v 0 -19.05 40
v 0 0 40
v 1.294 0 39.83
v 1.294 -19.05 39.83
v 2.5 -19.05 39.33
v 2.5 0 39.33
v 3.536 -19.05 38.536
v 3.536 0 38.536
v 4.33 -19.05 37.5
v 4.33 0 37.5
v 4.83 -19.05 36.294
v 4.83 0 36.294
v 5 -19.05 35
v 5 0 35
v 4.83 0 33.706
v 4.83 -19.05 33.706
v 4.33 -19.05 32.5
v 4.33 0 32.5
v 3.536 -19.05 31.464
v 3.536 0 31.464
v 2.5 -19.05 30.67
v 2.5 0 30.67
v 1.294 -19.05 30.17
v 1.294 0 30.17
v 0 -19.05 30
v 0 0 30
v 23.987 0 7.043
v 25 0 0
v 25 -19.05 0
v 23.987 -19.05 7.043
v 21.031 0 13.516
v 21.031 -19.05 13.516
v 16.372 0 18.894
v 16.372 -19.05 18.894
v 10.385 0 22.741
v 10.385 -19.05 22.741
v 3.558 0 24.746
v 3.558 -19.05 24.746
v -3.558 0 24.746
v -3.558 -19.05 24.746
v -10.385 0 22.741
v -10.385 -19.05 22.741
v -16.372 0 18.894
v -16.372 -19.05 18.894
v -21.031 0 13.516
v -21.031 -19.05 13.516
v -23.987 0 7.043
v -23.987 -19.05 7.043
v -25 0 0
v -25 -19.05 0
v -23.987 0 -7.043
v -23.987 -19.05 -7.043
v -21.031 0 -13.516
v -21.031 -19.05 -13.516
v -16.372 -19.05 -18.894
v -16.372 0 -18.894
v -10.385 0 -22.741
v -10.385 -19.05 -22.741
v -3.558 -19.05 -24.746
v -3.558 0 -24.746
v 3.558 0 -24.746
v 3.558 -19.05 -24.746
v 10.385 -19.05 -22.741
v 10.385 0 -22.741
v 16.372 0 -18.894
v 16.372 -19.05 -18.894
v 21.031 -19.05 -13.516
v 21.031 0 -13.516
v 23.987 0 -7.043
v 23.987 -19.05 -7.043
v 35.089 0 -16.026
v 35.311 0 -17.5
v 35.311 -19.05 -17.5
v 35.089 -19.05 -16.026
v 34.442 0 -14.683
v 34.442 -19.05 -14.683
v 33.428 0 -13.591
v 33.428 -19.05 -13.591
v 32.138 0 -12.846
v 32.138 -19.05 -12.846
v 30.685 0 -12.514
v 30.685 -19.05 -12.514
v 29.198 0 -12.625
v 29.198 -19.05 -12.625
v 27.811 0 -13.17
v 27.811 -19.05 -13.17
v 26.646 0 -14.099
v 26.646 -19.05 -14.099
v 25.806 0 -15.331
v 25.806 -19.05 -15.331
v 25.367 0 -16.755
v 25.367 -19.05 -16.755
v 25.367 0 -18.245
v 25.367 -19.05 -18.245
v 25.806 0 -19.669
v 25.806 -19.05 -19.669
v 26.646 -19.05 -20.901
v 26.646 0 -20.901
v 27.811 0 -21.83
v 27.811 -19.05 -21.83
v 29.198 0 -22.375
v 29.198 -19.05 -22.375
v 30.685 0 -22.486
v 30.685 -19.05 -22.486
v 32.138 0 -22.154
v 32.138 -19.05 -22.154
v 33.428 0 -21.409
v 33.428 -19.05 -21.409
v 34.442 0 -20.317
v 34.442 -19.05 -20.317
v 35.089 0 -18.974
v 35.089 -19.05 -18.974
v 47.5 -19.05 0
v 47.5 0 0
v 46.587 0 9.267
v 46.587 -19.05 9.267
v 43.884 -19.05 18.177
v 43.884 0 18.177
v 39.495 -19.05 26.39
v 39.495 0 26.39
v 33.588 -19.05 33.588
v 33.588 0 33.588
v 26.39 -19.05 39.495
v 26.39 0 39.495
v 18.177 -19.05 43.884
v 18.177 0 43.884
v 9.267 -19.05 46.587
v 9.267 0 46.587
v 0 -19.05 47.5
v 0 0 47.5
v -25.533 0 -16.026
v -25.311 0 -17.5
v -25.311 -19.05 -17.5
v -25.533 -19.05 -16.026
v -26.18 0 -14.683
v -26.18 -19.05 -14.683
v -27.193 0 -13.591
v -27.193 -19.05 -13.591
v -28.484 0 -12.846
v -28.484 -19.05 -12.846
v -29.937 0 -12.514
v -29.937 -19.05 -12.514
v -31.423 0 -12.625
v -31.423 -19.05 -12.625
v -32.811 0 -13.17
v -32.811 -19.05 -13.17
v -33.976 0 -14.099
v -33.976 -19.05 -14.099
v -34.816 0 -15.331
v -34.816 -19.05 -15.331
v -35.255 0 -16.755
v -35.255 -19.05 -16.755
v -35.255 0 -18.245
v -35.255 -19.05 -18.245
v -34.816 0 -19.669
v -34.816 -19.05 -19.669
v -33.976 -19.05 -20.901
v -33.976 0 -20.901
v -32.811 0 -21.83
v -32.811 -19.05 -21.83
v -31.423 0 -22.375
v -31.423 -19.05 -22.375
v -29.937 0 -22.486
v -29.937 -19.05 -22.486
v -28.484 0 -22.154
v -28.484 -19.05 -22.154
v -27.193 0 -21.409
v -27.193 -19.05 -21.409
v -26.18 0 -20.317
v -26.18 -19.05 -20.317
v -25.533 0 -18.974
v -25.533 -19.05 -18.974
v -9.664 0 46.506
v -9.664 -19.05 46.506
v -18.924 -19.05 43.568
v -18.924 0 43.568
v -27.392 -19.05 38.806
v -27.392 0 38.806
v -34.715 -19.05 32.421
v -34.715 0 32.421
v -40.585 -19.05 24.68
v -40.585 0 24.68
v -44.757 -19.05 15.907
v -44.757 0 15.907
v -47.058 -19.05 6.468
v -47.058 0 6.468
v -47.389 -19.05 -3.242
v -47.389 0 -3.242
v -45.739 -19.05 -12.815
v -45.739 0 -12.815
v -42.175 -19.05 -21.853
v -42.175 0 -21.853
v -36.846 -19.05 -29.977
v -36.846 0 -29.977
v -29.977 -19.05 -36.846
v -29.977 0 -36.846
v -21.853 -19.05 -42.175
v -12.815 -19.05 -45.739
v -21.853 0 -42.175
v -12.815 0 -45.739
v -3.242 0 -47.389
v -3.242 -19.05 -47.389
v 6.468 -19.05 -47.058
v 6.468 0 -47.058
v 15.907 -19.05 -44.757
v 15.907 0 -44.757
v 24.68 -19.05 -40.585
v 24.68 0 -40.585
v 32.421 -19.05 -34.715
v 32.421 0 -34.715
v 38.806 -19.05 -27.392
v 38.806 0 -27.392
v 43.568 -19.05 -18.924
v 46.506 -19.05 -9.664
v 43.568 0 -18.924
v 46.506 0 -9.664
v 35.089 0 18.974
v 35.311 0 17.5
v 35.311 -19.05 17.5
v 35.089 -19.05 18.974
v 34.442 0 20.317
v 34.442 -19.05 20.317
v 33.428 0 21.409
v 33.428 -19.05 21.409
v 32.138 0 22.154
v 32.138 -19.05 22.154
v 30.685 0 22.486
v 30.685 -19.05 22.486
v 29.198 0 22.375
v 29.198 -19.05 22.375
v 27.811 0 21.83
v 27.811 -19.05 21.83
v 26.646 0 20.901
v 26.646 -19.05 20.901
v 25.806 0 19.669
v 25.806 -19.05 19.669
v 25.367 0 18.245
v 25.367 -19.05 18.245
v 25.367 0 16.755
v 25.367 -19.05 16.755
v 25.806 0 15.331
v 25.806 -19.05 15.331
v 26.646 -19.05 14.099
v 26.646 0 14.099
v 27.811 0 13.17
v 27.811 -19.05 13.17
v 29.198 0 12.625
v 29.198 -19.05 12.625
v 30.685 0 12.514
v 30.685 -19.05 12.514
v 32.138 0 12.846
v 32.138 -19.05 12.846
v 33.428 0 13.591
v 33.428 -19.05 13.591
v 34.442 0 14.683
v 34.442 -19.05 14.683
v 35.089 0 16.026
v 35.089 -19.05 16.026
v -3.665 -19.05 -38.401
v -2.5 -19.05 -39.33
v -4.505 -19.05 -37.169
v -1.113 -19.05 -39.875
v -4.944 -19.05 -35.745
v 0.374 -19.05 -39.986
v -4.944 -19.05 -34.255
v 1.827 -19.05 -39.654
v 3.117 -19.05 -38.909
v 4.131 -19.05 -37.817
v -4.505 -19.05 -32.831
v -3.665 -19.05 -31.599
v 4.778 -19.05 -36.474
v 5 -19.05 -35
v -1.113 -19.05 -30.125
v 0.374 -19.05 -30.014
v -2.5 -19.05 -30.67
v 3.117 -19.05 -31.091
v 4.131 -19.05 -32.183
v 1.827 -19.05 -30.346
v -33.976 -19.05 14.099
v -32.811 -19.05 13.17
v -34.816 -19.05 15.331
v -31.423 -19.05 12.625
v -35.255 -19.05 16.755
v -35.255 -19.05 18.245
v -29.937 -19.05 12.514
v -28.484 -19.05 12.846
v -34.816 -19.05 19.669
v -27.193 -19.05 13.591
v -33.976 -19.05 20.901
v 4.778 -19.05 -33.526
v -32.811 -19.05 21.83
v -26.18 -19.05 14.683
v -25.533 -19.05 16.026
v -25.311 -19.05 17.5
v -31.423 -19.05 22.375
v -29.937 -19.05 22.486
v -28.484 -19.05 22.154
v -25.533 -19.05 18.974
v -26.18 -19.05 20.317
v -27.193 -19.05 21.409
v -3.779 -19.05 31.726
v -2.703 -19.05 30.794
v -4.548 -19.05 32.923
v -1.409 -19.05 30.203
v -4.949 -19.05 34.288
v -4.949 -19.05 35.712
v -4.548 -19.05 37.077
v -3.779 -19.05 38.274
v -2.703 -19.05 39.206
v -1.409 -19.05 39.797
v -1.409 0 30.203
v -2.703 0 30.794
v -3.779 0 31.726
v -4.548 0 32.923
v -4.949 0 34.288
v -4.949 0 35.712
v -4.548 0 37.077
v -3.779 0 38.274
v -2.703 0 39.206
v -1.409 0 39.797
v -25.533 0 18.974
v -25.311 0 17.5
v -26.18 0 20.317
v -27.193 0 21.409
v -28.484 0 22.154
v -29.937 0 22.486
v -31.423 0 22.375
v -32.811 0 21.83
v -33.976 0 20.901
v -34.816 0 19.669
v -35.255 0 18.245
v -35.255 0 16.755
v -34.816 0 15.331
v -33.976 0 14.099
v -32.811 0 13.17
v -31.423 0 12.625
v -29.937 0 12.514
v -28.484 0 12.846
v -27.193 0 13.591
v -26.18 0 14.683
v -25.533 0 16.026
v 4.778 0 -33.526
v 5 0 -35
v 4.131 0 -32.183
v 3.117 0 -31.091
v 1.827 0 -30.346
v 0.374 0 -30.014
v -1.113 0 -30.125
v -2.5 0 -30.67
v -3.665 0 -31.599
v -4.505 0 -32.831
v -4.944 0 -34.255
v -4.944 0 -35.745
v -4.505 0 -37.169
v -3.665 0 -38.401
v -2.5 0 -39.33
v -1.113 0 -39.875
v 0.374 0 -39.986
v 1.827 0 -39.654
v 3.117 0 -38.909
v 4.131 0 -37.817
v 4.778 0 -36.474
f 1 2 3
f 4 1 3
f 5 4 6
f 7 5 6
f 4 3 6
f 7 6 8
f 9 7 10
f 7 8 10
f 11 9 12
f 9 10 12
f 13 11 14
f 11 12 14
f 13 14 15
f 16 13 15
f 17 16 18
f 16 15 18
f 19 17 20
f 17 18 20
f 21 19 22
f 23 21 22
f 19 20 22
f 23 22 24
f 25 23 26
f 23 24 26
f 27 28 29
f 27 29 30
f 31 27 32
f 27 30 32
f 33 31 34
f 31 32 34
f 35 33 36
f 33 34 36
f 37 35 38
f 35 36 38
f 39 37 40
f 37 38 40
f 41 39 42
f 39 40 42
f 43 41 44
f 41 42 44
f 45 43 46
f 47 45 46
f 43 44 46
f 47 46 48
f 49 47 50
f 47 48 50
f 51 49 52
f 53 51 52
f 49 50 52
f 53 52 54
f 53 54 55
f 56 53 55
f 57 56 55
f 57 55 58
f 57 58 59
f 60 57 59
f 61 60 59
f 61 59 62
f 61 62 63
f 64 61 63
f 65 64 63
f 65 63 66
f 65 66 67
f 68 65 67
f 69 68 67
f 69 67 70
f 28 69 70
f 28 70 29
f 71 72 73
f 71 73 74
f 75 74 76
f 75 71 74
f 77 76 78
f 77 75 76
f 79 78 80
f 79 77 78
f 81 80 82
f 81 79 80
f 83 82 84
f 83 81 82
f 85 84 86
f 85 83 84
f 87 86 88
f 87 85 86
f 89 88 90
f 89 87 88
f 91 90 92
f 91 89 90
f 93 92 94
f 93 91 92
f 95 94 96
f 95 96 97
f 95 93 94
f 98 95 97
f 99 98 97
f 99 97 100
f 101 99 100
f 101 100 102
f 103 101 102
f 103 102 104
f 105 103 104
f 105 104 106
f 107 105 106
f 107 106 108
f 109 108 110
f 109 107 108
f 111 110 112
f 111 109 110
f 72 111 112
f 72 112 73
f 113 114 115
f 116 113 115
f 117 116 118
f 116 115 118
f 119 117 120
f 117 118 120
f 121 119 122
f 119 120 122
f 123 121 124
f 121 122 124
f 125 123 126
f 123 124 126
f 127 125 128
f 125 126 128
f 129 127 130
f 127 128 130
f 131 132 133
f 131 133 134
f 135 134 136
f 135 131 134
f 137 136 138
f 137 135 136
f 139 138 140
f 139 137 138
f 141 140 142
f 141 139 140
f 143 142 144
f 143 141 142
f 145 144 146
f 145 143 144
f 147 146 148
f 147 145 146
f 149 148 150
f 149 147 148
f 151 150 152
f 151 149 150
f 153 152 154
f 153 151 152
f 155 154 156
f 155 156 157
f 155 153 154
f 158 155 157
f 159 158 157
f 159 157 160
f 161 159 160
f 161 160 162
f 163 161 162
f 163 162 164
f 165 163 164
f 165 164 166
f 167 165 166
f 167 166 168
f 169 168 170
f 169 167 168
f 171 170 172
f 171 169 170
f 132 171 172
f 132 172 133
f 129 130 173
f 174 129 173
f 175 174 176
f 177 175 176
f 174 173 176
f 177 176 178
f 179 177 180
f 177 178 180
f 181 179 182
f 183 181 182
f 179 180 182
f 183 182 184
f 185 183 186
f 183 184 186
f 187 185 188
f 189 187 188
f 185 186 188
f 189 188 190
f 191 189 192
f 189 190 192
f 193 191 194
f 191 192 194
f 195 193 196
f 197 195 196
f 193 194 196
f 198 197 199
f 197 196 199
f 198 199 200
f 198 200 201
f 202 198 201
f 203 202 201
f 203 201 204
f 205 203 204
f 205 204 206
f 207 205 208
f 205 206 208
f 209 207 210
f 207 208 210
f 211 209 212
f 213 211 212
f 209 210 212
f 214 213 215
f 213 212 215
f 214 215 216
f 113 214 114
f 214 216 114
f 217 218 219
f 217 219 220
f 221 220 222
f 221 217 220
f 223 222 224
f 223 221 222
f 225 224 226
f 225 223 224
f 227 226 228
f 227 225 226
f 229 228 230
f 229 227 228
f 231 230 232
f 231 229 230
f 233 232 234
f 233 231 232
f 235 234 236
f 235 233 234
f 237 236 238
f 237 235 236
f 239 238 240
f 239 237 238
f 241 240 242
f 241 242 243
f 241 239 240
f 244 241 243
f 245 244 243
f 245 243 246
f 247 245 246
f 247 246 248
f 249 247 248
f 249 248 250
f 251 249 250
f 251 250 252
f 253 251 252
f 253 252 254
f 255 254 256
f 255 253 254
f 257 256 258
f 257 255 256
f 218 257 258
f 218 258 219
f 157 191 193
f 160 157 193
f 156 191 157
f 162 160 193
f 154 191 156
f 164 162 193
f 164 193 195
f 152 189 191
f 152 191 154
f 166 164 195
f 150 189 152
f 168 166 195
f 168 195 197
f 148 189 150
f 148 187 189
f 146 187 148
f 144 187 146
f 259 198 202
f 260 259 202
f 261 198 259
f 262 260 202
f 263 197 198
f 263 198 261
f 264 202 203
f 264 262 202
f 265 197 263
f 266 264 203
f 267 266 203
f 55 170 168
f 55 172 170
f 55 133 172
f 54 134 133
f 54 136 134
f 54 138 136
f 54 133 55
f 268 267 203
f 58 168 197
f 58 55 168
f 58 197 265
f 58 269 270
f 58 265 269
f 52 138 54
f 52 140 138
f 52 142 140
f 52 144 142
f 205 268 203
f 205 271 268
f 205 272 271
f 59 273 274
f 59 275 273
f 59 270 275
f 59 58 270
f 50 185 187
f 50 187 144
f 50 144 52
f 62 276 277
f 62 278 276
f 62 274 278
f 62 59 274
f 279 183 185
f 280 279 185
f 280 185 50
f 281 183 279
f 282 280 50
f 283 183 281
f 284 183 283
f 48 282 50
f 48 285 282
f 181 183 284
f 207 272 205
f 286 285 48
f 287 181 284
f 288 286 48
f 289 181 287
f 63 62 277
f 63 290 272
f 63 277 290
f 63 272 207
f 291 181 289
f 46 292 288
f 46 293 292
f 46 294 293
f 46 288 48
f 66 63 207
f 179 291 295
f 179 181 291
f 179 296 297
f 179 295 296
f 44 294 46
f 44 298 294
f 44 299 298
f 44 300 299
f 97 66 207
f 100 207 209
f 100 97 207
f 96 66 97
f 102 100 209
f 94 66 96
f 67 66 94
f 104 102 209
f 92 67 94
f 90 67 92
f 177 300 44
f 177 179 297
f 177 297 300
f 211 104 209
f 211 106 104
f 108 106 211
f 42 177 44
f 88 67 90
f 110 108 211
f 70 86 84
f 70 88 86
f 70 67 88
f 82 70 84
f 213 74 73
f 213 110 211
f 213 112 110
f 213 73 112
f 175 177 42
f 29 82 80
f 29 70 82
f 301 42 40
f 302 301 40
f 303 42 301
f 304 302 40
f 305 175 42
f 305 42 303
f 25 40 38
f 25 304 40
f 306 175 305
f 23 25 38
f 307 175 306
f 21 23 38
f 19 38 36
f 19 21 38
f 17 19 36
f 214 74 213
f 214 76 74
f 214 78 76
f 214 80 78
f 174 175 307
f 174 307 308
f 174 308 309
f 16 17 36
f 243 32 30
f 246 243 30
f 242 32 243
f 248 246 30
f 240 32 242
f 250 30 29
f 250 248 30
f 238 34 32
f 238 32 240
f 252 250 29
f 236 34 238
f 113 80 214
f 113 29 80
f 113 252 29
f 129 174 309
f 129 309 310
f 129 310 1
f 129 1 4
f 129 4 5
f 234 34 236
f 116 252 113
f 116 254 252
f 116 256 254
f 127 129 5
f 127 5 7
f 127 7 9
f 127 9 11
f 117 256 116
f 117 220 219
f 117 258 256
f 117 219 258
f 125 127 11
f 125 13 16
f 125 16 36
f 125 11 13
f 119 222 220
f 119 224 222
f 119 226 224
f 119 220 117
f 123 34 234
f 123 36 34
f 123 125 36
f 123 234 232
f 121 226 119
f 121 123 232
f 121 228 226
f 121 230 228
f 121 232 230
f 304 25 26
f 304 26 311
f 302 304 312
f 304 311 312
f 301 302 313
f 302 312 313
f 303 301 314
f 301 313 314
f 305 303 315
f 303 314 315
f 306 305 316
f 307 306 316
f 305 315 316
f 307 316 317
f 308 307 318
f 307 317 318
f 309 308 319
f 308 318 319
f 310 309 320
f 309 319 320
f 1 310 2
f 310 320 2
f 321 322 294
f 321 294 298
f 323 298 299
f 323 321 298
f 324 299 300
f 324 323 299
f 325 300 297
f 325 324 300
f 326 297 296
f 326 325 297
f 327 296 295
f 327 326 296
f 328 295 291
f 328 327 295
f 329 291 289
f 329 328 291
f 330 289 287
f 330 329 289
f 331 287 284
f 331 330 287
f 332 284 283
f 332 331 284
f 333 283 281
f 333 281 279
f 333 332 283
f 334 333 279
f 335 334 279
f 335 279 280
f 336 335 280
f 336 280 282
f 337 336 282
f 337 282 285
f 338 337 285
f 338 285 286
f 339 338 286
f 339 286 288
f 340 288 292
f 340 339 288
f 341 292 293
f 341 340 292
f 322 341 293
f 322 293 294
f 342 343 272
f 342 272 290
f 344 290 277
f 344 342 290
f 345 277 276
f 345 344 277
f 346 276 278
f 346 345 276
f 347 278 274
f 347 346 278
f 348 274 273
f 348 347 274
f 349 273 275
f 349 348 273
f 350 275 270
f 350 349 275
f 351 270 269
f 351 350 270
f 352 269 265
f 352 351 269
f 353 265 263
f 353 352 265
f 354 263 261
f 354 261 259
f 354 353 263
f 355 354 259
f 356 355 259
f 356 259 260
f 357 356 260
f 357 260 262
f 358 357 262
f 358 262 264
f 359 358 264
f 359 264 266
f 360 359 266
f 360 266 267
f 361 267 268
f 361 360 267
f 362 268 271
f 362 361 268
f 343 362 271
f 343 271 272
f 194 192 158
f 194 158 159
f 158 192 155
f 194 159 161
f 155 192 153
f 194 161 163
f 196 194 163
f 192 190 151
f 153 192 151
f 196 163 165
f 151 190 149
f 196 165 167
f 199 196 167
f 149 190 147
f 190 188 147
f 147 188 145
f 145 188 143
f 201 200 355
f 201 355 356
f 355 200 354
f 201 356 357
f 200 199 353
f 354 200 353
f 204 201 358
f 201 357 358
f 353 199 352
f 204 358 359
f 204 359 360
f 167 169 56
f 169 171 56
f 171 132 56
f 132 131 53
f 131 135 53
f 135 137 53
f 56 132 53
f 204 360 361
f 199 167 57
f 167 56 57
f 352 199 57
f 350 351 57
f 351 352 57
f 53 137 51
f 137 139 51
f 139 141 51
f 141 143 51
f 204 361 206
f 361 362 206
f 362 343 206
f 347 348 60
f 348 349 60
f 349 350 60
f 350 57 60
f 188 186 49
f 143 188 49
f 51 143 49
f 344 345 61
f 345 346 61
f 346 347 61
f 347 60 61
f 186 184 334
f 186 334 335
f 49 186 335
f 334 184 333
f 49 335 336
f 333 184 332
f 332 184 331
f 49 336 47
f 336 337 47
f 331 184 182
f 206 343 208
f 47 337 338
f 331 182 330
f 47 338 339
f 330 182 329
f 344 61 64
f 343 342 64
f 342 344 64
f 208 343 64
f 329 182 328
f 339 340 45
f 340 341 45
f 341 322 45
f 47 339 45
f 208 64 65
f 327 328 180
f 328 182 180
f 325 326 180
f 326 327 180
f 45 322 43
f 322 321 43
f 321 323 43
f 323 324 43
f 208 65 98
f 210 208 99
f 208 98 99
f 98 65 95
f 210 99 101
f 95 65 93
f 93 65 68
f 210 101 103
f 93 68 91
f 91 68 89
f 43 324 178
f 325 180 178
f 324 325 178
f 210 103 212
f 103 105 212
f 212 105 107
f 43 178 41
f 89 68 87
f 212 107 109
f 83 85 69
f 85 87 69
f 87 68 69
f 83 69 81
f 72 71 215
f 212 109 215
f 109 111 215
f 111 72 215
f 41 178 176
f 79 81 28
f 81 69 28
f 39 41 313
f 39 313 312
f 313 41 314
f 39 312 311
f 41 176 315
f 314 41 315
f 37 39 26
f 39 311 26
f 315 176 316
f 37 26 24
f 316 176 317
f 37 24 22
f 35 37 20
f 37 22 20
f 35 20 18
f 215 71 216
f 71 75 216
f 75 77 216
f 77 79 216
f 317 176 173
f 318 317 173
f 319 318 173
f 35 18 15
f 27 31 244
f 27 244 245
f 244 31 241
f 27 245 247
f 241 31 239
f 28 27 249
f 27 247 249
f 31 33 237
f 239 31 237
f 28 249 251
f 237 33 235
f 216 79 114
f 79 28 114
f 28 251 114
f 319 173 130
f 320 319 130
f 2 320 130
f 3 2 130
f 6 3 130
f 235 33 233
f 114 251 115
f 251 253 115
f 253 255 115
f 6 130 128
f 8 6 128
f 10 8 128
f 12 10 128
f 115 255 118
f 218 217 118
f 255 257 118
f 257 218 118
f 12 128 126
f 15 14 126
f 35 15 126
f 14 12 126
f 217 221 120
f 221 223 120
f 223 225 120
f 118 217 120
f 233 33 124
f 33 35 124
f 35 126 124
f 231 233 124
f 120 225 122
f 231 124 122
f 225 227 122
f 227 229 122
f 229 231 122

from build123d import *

# Parameters (mm, degrees)
F0_R     = 5
F1_DEPTH = 19.05
F4_R     = 25
F5_DEPTH = 25.4


# Not quite as in the source:
# - a feature of the source that left no trace in its solid (it failed there, or was rolled back) is left out


with BuildPart() as f1:
    # F0 (on Front) → F1 (new body)
    with BuildSketch(Plane.XZ):
        with BuildLine():
            ThreePointArc((0, 47.5), (-33.5875721064, -33.5875721064), (47.5, 0))
            ThreePointArc((47.5, 0), (33.5875721064, 33.5875721064), (0, 47.5))
        make_face()
        with Locations((-30.3108891325, -17.5)):
            Circle(F0_R, mode=Mode.SUBTRACT)
        with Locations((0, -35)):
            Circle(F0_R, mode=Mode.SUBTRACT)
        with Locations((30.3108891325, -17.5)):
            Circle(F0_R, mode=Mode.SUBTRACT)
        with Locations((-30.3108891325, 17.5)):
            Circle(F0_R, mode=Mode.SUBTRACT)
        with Locations((30.3108891325, 17.5)):
            Circle(F0_R, mode=Mode.SUBTRACT)
        with BuildLine():
            ThreePointArc((0, 30), (-5, 35), (0, 40))
            ThreePointArc((0, 40), (3.5355339059, 38.5355339059), (5, 35))
            ThreePointArc((5, 35), (3.5355339059, 31.4644660941), (0, 30))
        make_face(mode=Mode.SUBTRACT)
    extrude(amount=F1_DEPTH)

    # F4 (on face) → F5 (cut)
    with BuildSketch(Plane.XZ.offset(19.05)):
        Circle(F4_R)
    extrude(amount=-F5_DEPTH, mode=Mode.SUBTRACT)


solid = f1.part
